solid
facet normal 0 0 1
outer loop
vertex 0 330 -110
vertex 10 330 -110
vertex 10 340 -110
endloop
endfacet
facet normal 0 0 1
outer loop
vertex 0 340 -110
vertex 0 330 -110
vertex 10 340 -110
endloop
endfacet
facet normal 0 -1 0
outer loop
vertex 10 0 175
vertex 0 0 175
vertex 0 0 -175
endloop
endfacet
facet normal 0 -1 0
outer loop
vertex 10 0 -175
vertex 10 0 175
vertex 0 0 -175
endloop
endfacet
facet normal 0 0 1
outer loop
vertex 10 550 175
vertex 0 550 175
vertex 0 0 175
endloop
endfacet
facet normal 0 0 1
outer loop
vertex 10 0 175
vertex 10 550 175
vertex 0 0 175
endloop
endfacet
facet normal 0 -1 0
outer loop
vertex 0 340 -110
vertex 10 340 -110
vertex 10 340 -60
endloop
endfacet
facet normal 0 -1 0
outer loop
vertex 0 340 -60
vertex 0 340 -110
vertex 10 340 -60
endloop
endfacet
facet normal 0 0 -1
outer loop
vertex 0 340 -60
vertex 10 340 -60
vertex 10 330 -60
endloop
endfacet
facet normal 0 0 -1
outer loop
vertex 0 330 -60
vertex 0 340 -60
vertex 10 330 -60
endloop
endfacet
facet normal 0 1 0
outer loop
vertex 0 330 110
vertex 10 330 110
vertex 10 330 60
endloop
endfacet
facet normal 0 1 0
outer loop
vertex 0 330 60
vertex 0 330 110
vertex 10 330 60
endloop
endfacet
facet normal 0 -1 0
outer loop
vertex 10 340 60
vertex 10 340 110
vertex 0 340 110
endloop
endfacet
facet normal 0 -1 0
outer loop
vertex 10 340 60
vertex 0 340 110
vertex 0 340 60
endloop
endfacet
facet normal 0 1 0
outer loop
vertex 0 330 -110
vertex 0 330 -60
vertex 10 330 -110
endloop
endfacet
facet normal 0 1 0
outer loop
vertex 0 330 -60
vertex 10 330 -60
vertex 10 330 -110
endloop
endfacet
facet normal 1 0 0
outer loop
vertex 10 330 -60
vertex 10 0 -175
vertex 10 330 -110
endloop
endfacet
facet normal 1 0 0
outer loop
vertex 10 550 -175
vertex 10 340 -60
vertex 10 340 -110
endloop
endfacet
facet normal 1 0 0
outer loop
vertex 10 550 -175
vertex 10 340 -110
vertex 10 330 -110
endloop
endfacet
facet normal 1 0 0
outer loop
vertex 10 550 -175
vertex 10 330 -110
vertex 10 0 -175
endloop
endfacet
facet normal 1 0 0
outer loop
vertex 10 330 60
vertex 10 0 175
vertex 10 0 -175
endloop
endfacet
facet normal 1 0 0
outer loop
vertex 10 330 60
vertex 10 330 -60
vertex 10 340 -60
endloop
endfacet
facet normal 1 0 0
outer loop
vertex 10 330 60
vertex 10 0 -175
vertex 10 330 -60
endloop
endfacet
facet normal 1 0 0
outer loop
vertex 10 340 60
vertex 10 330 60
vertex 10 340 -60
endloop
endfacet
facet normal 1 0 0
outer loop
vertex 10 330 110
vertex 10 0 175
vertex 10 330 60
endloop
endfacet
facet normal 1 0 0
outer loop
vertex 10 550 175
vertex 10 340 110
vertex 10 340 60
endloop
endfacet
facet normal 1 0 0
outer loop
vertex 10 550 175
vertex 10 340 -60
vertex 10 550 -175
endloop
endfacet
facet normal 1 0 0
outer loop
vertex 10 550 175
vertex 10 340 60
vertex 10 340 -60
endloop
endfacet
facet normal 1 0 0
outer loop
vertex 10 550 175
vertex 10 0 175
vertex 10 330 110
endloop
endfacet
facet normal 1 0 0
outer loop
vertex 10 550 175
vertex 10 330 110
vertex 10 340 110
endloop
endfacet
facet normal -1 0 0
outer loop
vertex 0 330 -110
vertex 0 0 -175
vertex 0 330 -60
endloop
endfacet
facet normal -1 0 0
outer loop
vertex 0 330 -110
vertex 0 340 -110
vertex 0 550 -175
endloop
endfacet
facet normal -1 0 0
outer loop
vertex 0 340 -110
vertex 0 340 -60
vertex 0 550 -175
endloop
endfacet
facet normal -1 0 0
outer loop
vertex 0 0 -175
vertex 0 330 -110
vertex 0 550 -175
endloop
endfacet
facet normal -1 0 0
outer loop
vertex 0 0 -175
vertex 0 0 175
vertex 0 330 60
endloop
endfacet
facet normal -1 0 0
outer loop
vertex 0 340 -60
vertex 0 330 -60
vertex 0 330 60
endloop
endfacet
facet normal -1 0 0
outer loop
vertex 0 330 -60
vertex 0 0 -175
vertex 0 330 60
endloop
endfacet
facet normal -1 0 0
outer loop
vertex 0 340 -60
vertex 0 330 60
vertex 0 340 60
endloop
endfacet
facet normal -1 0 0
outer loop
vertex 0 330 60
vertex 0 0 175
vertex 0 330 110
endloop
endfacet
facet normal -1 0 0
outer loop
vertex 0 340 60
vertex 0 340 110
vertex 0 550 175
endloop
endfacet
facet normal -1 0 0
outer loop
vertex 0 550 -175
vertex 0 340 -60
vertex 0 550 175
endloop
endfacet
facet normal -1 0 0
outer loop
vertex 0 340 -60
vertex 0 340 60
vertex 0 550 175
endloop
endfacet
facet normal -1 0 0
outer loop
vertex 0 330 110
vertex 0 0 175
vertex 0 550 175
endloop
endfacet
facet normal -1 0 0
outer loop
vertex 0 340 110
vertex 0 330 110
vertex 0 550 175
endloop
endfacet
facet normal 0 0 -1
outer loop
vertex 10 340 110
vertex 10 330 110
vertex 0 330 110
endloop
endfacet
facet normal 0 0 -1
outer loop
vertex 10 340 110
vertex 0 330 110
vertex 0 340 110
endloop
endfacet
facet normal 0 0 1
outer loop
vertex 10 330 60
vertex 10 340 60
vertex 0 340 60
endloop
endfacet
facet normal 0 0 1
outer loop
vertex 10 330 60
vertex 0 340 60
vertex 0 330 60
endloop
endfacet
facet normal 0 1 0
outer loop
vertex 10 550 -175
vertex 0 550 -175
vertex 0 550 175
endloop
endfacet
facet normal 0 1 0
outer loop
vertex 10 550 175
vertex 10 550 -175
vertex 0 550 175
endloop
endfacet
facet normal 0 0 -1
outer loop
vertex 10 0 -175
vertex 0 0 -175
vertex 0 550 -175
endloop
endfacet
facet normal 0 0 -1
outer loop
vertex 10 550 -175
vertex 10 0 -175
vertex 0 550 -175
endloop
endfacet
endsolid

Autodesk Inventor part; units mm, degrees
ref_plane "YZ Plane" through (0, 0, 0) normal (1, 0, 0) x (0, 1, 0)
ref_plane "XZ Plane" through (0, 0, 0) normal (0, 1, 0) x (-1, 0, 0)
ref_plane "XY Plane" through (0, 0, 0) normal (0, 0, 1) x (1, 0, 0)
sketch "Sketch1" plane through (0, 0, 0) normal (1, 0, 0) x (0, 1, 0)
  line L0 (550, 175) -> (0, 175)
  line L1 (0, 175) -> (0, -175)
  line L2 (0, -175) -> (550, -175)
  line L3 (550, -175) -> (550, 175)
  point P0 (0, 0)
  point P1 (0, 0)
  dimension "d0" = 550
  dimension "d1" = 350
  dimension "d2" = 175
  dimension "d3" = 0
extrude "Extrusion1" add sketch "Sketch1" along normal blind 10
sketch "Sketch2" plane through (10, 0, 0) normal (1, 0, 0) x (0, 0, -1)
  line L0 (-110, 340) -> (-60, 340)
  line L1 (-60, 340) -> (-60, 330)
  line L2 (-110, 330) -> (-110, 340)
  line L3 (110, 340) -> (60, 340)
  line L4 (60, 340) -> (60, 330)
  line L5 (60, 330) -> (110, 330)
  line L6 (110, 330) -> (110, 340)
  line L7 (175, 550) -> (-175, 550) projected
  line L8 (-110, 330) -> (-60, 330)
  point P0 (0, 0)
  dimension "d6" = 50
  dimension "d7" = 60
  dimension "d18" = 210
  dimension "d19" = 10
  dimension "d20" = 10
  dimension "d22" = 10
  dimension "d23" = 10
  dimension "d24" = 50
  dimension "d25" = 210
  dimension "d26" = 60
extrude "Extrusion3" cut sketch "Sketch2" against normal blind 10
properties part number "mount_slottedPanel"
